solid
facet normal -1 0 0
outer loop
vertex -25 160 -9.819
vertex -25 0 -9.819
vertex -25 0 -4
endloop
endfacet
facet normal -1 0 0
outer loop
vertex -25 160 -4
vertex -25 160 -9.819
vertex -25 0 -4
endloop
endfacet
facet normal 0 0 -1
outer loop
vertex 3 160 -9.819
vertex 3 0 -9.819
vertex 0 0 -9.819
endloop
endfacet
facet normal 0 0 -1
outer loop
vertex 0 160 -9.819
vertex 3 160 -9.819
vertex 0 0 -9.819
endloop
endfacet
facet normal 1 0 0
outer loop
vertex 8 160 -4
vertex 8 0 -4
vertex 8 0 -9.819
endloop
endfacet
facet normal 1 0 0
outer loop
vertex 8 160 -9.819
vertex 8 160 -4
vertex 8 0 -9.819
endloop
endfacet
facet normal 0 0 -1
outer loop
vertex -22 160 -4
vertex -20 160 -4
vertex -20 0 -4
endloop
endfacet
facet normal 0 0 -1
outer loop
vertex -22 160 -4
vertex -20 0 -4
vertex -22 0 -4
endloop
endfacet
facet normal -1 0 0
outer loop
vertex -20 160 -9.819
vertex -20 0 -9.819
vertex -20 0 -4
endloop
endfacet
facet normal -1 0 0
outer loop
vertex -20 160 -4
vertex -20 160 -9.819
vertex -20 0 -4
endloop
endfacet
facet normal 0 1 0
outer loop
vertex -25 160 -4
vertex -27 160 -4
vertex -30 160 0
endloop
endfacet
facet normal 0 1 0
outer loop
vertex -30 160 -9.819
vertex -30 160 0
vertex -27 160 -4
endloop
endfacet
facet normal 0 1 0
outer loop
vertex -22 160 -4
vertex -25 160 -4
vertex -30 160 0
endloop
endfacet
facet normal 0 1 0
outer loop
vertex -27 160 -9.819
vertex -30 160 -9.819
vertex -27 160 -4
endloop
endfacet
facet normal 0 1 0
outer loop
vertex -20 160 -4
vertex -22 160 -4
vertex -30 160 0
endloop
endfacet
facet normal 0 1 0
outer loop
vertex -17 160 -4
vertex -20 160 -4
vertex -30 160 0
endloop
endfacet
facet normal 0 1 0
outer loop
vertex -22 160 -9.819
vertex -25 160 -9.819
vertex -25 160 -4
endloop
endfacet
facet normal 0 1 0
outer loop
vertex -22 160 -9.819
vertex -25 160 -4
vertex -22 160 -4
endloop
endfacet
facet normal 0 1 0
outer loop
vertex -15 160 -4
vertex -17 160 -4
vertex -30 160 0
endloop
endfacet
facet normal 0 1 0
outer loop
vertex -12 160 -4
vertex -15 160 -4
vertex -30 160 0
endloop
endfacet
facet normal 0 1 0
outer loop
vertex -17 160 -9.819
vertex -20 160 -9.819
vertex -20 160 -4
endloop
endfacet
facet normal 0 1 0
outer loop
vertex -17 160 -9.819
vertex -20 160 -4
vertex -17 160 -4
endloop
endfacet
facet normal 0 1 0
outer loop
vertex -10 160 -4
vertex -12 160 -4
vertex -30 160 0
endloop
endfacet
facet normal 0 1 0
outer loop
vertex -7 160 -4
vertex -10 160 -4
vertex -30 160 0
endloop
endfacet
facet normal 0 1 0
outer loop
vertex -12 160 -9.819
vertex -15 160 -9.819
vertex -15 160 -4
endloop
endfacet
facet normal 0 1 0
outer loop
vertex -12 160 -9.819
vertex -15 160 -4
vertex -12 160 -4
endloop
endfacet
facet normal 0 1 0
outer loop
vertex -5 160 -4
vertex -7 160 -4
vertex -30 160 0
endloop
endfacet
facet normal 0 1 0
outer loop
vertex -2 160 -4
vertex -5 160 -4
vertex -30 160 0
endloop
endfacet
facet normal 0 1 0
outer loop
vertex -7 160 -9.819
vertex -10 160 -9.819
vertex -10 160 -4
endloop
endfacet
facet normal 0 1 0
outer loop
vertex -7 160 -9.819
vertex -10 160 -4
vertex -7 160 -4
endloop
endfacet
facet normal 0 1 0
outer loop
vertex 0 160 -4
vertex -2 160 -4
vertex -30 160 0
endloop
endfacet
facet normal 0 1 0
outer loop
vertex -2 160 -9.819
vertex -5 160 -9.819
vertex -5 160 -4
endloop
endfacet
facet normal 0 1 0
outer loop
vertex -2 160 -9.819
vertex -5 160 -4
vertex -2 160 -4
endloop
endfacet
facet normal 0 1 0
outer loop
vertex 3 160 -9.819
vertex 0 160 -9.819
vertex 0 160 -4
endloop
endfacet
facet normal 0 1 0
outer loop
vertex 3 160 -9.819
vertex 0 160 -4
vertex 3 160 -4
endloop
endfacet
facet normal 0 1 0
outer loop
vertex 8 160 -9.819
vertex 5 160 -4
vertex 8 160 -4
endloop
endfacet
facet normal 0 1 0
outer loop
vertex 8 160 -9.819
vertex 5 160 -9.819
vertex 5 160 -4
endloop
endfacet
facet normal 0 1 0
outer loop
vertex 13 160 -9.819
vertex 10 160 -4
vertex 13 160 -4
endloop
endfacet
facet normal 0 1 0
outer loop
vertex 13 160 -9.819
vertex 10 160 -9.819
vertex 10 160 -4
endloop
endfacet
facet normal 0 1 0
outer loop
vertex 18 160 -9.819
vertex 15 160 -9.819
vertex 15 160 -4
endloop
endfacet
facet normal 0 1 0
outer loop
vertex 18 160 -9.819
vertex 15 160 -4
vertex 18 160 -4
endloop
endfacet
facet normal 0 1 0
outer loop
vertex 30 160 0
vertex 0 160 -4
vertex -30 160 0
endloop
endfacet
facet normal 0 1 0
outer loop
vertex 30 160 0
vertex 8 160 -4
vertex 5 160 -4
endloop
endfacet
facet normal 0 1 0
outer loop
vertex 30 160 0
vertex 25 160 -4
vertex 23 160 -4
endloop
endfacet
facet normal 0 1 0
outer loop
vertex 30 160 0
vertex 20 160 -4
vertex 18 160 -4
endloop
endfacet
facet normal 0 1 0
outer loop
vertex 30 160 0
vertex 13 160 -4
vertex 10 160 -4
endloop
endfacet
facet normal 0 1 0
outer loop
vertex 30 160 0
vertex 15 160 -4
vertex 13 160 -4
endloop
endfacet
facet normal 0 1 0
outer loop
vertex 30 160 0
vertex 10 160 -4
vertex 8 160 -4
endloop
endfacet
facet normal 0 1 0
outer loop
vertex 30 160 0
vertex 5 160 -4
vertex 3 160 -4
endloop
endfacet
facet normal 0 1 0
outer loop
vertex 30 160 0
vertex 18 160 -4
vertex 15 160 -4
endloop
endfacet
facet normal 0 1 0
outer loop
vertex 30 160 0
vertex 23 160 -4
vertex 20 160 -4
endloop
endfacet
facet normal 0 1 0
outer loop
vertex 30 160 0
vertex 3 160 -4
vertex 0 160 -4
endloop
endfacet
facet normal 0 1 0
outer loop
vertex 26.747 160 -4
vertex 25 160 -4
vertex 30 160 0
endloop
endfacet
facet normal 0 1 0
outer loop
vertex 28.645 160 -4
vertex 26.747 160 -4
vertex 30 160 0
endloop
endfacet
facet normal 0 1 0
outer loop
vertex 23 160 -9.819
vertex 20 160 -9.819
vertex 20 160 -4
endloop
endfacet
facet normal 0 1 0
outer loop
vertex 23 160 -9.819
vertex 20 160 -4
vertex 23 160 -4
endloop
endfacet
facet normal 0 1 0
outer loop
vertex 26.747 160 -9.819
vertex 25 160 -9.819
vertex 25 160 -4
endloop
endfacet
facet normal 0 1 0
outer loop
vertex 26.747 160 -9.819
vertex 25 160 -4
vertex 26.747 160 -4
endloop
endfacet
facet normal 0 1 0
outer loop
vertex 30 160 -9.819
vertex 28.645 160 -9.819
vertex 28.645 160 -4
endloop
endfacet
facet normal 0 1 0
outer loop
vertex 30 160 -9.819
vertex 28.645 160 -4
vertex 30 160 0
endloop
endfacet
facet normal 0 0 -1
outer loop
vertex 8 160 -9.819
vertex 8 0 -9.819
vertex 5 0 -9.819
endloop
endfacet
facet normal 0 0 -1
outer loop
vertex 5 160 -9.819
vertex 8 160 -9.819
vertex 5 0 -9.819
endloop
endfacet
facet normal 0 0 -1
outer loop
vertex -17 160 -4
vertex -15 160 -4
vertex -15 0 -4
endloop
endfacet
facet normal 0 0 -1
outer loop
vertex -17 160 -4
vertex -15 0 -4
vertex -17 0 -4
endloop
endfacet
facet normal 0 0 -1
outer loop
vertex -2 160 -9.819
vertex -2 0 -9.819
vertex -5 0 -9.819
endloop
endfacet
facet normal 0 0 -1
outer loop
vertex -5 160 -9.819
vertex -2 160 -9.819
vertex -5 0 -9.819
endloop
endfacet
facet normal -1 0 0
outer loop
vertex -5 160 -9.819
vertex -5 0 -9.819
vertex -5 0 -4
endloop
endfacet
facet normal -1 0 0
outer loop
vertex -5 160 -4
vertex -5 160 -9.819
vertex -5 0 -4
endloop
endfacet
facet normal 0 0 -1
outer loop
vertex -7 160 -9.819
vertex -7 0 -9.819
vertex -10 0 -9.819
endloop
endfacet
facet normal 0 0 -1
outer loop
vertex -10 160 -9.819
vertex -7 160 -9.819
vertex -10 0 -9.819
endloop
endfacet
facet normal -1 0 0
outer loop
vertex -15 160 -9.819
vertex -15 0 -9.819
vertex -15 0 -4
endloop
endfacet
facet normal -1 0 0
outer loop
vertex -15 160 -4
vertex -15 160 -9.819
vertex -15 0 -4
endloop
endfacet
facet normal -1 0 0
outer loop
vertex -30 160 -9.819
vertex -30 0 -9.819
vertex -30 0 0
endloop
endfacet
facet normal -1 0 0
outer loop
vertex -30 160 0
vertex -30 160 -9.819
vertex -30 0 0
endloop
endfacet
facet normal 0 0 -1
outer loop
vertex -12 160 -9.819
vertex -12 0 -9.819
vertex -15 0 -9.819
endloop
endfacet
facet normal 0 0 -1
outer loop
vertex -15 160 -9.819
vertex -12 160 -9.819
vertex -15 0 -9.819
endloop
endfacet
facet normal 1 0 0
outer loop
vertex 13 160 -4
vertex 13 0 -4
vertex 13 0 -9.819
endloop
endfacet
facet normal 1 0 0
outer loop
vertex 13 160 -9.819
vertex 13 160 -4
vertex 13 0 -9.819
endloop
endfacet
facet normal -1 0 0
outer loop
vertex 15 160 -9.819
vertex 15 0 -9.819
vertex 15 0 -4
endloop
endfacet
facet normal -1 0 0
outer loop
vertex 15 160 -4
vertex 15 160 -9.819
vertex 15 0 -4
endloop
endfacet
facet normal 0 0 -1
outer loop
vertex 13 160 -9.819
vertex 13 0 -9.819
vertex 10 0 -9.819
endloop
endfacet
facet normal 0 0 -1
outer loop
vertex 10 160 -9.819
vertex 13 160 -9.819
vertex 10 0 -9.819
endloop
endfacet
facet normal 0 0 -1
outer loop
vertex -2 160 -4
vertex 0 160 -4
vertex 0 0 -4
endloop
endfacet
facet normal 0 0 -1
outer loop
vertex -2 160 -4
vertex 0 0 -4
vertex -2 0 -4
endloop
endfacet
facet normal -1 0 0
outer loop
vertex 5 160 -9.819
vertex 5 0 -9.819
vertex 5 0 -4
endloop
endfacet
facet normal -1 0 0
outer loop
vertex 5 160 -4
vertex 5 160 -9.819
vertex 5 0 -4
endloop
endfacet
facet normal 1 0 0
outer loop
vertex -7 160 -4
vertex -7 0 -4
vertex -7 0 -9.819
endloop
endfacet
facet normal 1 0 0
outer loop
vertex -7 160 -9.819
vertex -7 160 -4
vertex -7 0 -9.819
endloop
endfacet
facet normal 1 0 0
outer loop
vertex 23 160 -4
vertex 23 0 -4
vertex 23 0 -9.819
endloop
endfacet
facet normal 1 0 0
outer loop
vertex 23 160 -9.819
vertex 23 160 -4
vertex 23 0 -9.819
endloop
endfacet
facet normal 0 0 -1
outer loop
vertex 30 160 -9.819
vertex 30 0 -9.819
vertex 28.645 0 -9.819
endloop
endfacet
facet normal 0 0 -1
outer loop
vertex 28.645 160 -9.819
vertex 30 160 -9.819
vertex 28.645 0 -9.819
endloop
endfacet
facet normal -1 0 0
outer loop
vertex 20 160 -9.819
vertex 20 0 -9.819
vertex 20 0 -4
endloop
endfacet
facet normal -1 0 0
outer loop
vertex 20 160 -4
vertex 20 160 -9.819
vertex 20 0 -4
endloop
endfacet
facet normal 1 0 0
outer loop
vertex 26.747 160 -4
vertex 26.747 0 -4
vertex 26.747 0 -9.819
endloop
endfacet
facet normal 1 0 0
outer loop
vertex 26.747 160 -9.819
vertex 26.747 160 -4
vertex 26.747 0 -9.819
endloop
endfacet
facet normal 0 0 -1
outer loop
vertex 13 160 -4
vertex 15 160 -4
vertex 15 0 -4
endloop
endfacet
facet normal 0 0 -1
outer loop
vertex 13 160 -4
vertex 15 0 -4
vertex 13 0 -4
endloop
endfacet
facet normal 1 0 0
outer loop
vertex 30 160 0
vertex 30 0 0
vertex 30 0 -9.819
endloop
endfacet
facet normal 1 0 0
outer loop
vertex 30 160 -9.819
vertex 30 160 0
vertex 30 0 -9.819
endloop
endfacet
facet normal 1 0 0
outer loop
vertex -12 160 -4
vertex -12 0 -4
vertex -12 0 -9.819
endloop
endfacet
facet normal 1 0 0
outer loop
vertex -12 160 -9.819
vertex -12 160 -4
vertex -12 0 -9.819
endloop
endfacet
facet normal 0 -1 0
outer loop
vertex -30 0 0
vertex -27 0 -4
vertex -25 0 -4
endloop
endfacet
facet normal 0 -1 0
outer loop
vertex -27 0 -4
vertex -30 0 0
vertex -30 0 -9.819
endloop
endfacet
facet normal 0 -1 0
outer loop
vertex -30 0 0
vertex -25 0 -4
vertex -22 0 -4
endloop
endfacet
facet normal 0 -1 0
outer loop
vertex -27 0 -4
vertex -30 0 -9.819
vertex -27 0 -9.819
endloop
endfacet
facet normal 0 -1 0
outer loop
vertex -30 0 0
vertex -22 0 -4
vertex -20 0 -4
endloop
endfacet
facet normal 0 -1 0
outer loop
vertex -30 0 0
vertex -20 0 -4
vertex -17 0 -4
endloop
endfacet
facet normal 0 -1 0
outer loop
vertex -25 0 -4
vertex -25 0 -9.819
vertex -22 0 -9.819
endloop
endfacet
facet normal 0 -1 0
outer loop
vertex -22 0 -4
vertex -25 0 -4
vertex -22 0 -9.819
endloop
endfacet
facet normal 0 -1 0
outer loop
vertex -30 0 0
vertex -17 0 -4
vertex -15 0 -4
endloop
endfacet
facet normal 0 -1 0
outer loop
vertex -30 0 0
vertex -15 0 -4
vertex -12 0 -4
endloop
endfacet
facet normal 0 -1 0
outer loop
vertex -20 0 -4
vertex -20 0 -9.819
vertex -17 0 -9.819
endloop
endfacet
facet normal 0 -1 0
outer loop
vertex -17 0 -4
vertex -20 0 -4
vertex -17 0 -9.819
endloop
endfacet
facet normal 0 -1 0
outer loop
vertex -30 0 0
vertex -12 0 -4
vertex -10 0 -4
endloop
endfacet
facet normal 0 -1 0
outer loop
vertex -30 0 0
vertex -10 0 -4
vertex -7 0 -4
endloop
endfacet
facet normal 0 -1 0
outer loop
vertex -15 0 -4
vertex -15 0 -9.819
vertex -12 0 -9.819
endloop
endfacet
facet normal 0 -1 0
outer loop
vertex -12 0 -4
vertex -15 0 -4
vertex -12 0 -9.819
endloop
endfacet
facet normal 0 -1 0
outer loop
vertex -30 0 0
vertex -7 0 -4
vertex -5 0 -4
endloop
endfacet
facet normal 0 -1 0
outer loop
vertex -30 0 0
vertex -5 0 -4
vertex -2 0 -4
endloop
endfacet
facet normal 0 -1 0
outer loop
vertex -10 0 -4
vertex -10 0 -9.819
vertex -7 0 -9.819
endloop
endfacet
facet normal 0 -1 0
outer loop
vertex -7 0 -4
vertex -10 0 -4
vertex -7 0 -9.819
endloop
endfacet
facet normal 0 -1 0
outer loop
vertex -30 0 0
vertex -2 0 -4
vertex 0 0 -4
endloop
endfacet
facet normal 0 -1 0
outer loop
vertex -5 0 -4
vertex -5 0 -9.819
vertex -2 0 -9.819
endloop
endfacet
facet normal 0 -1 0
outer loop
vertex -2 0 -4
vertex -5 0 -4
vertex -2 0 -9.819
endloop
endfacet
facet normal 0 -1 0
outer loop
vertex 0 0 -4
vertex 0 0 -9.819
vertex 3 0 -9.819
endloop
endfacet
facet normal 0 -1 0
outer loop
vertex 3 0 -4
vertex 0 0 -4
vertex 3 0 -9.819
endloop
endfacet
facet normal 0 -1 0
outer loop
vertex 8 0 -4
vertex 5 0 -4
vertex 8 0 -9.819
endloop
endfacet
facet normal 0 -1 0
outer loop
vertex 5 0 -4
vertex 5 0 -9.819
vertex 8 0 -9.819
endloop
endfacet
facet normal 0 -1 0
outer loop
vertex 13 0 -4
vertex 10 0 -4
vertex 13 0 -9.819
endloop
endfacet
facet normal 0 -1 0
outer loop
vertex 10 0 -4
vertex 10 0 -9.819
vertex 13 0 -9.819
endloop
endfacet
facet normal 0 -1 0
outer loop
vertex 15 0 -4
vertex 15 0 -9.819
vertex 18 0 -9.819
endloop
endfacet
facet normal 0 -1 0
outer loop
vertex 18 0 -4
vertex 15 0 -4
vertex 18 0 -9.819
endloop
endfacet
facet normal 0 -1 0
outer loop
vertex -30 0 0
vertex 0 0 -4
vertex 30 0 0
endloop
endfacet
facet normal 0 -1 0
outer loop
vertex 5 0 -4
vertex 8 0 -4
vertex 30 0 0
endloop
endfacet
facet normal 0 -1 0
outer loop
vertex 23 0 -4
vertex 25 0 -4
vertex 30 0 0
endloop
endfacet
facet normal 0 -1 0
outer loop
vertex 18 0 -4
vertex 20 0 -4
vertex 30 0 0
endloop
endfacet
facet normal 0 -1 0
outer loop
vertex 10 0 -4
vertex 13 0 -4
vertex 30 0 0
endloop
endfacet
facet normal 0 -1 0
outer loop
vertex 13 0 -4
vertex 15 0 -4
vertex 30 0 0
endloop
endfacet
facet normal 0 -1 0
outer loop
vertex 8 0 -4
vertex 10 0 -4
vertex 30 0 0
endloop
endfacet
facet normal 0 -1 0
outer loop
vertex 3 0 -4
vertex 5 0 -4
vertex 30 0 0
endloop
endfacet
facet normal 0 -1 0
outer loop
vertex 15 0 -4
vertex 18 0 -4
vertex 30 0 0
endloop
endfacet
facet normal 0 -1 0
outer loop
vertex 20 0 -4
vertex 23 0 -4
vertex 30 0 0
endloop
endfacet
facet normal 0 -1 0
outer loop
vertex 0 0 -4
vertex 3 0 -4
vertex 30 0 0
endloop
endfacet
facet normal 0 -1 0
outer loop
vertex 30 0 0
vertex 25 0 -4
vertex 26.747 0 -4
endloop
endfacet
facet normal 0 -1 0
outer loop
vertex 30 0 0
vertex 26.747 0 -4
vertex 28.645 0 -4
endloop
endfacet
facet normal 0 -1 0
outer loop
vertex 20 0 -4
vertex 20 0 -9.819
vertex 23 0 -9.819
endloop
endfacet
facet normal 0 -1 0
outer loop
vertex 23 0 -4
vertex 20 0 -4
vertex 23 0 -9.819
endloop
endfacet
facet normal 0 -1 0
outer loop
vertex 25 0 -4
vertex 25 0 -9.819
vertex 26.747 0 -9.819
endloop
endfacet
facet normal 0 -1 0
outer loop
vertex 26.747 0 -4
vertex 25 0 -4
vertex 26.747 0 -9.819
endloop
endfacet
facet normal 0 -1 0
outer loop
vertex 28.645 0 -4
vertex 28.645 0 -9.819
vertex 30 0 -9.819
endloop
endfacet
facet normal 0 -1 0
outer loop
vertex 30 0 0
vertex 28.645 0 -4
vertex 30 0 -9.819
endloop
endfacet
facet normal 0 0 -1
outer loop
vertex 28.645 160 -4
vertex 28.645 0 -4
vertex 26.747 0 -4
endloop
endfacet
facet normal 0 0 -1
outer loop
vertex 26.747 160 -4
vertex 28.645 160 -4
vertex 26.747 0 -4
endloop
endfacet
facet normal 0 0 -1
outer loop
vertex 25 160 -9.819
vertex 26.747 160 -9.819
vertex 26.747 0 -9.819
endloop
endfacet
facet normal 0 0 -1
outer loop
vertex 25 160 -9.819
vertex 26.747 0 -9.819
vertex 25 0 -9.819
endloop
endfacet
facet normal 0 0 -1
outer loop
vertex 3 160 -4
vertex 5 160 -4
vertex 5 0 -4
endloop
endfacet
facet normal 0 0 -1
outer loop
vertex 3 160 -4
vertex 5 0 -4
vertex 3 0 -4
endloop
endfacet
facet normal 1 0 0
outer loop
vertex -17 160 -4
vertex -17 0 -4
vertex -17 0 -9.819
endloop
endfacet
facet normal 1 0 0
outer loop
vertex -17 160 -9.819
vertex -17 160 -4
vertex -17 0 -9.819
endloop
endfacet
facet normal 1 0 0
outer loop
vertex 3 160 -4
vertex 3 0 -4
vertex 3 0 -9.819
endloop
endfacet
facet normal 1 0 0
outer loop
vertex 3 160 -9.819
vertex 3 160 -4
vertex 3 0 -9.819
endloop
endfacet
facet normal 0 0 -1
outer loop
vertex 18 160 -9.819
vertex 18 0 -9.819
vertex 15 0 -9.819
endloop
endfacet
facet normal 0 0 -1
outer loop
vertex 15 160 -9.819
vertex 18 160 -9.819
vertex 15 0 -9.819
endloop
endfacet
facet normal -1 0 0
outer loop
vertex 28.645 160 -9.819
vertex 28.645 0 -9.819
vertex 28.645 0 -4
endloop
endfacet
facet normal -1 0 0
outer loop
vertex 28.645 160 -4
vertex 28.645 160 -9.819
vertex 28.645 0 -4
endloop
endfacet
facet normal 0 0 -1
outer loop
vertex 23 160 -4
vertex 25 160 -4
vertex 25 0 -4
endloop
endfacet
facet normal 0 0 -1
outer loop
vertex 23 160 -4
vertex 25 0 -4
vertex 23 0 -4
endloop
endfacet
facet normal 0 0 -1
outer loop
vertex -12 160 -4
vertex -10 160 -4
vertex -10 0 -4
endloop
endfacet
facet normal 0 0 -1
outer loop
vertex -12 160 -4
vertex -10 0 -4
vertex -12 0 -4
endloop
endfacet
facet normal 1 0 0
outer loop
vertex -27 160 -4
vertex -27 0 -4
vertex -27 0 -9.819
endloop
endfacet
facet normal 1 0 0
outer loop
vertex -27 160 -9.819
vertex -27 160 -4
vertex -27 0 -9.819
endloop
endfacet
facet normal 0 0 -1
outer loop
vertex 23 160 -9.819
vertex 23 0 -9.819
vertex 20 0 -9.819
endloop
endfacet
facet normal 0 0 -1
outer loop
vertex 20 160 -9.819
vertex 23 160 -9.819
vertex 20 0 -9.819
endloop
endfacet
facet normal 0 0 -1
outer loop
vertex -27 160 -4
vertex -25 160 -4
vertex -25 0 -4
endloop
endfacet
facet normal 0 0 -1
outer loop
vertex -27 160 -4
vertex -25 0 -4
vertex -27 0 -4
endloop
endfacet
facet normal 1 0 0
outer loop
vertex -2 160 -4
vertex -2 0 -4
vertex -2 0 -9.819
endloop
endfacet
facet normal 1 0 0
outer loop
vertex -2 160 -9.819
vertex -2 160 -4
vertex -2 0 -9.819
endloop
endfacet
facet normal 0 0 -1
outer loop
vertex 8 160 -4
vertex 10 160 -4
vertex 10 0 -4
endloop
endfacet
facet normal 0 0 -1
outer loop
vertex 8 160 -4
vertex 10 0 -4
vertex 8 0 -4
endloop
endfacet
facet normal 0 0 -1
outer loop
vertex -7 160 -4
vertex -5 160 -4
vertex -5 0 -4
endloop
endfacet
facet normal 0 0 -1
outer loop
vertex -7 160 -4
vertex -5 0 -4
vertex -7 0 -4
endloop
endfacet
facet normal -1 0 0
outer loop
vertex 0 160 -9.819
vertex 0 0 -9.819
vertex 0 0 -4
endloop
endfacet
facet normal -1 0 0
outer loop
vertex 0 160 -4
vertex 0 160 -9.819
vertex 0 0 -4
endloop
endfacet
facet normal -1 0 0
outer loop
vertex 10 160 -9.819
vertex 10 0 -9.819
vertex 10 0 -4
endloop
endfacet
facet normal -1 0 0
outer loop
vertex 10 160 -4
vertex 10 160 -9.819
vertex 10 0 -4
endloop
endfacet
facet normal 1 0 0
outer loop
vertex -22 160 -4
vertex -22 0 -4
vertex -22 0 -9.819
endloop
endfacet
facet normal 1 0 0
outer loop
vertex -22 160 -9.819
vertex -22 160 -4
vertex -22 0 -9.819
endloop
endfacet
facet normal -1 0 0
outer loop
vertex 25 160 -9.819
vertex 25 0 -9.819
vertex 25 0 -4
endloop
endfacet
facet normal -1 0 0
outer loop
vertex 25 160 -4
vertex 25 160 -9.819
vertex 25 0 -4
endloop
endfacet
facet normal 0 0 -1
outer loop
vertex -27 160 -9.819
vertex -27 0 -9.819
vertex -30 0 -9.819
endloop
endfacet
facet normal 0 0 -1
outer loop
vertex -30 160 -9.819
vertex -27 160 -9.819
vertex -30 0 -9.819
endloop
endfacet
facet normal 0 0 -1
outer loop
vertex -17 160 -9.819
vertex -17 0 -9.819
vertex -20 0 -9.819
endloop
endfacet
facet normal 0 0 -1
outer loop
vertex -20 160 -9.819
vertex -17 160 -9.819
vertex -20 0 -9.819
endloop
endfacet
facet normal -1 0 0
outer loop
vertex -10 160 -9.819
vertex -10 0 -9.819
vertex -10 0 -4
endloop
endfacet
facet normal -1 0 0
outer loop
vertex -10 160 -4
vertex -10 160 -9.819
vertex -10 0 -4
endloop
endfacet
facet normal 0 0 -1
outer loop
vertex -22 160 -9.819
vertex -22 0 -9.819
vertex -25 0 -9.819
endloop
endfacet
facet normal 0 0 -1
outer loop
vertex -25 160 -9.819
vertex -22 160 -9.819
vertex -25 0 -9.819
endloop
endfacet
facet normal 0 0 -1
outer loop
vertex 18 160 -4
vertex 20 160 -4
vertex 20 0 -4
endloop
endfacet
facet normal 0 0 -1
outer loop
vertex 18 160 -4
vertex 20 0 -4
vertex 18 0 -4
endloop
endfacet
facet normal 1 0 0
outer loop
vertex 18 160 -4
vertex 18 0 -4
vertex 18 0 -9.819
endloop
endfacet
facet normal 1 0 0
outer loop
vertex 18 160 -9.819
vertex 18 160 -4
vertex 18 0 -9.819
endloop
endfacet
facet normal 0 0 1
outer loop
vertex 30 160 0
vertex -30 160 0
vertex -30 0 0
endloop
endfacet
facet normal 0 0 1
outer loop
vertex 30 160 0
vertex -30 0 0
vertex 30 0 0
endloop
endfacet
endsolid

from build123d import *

# Parameters (mm, degrees)
EXTRUDE_1_DEPTH = 160


with BuildPart() as part:
    # Эскиз1 → Бобышка-Вытянуть1 (new body)
    with BuildSketch(Plane(origin=(0, 0, 0), x_dir=(1, 0, 0), z_dir=(0, 1, 0))):
        Polygon((-30, 0), (30, 0), (30, 9.81929979), (28.644603918, 9.81929979), (28.644603918, 4), (26.747359492, 4), (26.747359492, 9.81929979), (25, 9.81929979), (25, 4), (23, 4), (23, 9.81929979), (20, 9.81929979), (20, 4), (18, 4), (18, 9.81929979), (15, 9.81929979), (15, 4), (13, 4), (13, 9.81929979), (10, 9.81929979), (10, 4), (8, 4), (8, 9.81929979), (5, 9.81929979), (5, 4), (3, 4), (3, 9.81929979), (0, 9.81929979), (0, 4), (-2, 4), (-2, 9.81929979), (-5, 9.81929979), (-5, 4), (-7, 4), (-7, 9.81929979), (-10, 9.81929979), (-10, 4), (-12, 4), (-12, 9.81929979), (-15, 9.81929979), (-15, 4), (-17, 4), (-17, 9.81929979), (-20, 9.81929979), (-20, 4), (-22, 4), (-22, 9.81929979), (-25, 9.81929979), (-25, 4), (-27, 4), (-27, 9.81929979), (-30, 9.81929979), align=None)
    extrude(amount=EXTRUDE_1_DEPTH)


solid = part.part
